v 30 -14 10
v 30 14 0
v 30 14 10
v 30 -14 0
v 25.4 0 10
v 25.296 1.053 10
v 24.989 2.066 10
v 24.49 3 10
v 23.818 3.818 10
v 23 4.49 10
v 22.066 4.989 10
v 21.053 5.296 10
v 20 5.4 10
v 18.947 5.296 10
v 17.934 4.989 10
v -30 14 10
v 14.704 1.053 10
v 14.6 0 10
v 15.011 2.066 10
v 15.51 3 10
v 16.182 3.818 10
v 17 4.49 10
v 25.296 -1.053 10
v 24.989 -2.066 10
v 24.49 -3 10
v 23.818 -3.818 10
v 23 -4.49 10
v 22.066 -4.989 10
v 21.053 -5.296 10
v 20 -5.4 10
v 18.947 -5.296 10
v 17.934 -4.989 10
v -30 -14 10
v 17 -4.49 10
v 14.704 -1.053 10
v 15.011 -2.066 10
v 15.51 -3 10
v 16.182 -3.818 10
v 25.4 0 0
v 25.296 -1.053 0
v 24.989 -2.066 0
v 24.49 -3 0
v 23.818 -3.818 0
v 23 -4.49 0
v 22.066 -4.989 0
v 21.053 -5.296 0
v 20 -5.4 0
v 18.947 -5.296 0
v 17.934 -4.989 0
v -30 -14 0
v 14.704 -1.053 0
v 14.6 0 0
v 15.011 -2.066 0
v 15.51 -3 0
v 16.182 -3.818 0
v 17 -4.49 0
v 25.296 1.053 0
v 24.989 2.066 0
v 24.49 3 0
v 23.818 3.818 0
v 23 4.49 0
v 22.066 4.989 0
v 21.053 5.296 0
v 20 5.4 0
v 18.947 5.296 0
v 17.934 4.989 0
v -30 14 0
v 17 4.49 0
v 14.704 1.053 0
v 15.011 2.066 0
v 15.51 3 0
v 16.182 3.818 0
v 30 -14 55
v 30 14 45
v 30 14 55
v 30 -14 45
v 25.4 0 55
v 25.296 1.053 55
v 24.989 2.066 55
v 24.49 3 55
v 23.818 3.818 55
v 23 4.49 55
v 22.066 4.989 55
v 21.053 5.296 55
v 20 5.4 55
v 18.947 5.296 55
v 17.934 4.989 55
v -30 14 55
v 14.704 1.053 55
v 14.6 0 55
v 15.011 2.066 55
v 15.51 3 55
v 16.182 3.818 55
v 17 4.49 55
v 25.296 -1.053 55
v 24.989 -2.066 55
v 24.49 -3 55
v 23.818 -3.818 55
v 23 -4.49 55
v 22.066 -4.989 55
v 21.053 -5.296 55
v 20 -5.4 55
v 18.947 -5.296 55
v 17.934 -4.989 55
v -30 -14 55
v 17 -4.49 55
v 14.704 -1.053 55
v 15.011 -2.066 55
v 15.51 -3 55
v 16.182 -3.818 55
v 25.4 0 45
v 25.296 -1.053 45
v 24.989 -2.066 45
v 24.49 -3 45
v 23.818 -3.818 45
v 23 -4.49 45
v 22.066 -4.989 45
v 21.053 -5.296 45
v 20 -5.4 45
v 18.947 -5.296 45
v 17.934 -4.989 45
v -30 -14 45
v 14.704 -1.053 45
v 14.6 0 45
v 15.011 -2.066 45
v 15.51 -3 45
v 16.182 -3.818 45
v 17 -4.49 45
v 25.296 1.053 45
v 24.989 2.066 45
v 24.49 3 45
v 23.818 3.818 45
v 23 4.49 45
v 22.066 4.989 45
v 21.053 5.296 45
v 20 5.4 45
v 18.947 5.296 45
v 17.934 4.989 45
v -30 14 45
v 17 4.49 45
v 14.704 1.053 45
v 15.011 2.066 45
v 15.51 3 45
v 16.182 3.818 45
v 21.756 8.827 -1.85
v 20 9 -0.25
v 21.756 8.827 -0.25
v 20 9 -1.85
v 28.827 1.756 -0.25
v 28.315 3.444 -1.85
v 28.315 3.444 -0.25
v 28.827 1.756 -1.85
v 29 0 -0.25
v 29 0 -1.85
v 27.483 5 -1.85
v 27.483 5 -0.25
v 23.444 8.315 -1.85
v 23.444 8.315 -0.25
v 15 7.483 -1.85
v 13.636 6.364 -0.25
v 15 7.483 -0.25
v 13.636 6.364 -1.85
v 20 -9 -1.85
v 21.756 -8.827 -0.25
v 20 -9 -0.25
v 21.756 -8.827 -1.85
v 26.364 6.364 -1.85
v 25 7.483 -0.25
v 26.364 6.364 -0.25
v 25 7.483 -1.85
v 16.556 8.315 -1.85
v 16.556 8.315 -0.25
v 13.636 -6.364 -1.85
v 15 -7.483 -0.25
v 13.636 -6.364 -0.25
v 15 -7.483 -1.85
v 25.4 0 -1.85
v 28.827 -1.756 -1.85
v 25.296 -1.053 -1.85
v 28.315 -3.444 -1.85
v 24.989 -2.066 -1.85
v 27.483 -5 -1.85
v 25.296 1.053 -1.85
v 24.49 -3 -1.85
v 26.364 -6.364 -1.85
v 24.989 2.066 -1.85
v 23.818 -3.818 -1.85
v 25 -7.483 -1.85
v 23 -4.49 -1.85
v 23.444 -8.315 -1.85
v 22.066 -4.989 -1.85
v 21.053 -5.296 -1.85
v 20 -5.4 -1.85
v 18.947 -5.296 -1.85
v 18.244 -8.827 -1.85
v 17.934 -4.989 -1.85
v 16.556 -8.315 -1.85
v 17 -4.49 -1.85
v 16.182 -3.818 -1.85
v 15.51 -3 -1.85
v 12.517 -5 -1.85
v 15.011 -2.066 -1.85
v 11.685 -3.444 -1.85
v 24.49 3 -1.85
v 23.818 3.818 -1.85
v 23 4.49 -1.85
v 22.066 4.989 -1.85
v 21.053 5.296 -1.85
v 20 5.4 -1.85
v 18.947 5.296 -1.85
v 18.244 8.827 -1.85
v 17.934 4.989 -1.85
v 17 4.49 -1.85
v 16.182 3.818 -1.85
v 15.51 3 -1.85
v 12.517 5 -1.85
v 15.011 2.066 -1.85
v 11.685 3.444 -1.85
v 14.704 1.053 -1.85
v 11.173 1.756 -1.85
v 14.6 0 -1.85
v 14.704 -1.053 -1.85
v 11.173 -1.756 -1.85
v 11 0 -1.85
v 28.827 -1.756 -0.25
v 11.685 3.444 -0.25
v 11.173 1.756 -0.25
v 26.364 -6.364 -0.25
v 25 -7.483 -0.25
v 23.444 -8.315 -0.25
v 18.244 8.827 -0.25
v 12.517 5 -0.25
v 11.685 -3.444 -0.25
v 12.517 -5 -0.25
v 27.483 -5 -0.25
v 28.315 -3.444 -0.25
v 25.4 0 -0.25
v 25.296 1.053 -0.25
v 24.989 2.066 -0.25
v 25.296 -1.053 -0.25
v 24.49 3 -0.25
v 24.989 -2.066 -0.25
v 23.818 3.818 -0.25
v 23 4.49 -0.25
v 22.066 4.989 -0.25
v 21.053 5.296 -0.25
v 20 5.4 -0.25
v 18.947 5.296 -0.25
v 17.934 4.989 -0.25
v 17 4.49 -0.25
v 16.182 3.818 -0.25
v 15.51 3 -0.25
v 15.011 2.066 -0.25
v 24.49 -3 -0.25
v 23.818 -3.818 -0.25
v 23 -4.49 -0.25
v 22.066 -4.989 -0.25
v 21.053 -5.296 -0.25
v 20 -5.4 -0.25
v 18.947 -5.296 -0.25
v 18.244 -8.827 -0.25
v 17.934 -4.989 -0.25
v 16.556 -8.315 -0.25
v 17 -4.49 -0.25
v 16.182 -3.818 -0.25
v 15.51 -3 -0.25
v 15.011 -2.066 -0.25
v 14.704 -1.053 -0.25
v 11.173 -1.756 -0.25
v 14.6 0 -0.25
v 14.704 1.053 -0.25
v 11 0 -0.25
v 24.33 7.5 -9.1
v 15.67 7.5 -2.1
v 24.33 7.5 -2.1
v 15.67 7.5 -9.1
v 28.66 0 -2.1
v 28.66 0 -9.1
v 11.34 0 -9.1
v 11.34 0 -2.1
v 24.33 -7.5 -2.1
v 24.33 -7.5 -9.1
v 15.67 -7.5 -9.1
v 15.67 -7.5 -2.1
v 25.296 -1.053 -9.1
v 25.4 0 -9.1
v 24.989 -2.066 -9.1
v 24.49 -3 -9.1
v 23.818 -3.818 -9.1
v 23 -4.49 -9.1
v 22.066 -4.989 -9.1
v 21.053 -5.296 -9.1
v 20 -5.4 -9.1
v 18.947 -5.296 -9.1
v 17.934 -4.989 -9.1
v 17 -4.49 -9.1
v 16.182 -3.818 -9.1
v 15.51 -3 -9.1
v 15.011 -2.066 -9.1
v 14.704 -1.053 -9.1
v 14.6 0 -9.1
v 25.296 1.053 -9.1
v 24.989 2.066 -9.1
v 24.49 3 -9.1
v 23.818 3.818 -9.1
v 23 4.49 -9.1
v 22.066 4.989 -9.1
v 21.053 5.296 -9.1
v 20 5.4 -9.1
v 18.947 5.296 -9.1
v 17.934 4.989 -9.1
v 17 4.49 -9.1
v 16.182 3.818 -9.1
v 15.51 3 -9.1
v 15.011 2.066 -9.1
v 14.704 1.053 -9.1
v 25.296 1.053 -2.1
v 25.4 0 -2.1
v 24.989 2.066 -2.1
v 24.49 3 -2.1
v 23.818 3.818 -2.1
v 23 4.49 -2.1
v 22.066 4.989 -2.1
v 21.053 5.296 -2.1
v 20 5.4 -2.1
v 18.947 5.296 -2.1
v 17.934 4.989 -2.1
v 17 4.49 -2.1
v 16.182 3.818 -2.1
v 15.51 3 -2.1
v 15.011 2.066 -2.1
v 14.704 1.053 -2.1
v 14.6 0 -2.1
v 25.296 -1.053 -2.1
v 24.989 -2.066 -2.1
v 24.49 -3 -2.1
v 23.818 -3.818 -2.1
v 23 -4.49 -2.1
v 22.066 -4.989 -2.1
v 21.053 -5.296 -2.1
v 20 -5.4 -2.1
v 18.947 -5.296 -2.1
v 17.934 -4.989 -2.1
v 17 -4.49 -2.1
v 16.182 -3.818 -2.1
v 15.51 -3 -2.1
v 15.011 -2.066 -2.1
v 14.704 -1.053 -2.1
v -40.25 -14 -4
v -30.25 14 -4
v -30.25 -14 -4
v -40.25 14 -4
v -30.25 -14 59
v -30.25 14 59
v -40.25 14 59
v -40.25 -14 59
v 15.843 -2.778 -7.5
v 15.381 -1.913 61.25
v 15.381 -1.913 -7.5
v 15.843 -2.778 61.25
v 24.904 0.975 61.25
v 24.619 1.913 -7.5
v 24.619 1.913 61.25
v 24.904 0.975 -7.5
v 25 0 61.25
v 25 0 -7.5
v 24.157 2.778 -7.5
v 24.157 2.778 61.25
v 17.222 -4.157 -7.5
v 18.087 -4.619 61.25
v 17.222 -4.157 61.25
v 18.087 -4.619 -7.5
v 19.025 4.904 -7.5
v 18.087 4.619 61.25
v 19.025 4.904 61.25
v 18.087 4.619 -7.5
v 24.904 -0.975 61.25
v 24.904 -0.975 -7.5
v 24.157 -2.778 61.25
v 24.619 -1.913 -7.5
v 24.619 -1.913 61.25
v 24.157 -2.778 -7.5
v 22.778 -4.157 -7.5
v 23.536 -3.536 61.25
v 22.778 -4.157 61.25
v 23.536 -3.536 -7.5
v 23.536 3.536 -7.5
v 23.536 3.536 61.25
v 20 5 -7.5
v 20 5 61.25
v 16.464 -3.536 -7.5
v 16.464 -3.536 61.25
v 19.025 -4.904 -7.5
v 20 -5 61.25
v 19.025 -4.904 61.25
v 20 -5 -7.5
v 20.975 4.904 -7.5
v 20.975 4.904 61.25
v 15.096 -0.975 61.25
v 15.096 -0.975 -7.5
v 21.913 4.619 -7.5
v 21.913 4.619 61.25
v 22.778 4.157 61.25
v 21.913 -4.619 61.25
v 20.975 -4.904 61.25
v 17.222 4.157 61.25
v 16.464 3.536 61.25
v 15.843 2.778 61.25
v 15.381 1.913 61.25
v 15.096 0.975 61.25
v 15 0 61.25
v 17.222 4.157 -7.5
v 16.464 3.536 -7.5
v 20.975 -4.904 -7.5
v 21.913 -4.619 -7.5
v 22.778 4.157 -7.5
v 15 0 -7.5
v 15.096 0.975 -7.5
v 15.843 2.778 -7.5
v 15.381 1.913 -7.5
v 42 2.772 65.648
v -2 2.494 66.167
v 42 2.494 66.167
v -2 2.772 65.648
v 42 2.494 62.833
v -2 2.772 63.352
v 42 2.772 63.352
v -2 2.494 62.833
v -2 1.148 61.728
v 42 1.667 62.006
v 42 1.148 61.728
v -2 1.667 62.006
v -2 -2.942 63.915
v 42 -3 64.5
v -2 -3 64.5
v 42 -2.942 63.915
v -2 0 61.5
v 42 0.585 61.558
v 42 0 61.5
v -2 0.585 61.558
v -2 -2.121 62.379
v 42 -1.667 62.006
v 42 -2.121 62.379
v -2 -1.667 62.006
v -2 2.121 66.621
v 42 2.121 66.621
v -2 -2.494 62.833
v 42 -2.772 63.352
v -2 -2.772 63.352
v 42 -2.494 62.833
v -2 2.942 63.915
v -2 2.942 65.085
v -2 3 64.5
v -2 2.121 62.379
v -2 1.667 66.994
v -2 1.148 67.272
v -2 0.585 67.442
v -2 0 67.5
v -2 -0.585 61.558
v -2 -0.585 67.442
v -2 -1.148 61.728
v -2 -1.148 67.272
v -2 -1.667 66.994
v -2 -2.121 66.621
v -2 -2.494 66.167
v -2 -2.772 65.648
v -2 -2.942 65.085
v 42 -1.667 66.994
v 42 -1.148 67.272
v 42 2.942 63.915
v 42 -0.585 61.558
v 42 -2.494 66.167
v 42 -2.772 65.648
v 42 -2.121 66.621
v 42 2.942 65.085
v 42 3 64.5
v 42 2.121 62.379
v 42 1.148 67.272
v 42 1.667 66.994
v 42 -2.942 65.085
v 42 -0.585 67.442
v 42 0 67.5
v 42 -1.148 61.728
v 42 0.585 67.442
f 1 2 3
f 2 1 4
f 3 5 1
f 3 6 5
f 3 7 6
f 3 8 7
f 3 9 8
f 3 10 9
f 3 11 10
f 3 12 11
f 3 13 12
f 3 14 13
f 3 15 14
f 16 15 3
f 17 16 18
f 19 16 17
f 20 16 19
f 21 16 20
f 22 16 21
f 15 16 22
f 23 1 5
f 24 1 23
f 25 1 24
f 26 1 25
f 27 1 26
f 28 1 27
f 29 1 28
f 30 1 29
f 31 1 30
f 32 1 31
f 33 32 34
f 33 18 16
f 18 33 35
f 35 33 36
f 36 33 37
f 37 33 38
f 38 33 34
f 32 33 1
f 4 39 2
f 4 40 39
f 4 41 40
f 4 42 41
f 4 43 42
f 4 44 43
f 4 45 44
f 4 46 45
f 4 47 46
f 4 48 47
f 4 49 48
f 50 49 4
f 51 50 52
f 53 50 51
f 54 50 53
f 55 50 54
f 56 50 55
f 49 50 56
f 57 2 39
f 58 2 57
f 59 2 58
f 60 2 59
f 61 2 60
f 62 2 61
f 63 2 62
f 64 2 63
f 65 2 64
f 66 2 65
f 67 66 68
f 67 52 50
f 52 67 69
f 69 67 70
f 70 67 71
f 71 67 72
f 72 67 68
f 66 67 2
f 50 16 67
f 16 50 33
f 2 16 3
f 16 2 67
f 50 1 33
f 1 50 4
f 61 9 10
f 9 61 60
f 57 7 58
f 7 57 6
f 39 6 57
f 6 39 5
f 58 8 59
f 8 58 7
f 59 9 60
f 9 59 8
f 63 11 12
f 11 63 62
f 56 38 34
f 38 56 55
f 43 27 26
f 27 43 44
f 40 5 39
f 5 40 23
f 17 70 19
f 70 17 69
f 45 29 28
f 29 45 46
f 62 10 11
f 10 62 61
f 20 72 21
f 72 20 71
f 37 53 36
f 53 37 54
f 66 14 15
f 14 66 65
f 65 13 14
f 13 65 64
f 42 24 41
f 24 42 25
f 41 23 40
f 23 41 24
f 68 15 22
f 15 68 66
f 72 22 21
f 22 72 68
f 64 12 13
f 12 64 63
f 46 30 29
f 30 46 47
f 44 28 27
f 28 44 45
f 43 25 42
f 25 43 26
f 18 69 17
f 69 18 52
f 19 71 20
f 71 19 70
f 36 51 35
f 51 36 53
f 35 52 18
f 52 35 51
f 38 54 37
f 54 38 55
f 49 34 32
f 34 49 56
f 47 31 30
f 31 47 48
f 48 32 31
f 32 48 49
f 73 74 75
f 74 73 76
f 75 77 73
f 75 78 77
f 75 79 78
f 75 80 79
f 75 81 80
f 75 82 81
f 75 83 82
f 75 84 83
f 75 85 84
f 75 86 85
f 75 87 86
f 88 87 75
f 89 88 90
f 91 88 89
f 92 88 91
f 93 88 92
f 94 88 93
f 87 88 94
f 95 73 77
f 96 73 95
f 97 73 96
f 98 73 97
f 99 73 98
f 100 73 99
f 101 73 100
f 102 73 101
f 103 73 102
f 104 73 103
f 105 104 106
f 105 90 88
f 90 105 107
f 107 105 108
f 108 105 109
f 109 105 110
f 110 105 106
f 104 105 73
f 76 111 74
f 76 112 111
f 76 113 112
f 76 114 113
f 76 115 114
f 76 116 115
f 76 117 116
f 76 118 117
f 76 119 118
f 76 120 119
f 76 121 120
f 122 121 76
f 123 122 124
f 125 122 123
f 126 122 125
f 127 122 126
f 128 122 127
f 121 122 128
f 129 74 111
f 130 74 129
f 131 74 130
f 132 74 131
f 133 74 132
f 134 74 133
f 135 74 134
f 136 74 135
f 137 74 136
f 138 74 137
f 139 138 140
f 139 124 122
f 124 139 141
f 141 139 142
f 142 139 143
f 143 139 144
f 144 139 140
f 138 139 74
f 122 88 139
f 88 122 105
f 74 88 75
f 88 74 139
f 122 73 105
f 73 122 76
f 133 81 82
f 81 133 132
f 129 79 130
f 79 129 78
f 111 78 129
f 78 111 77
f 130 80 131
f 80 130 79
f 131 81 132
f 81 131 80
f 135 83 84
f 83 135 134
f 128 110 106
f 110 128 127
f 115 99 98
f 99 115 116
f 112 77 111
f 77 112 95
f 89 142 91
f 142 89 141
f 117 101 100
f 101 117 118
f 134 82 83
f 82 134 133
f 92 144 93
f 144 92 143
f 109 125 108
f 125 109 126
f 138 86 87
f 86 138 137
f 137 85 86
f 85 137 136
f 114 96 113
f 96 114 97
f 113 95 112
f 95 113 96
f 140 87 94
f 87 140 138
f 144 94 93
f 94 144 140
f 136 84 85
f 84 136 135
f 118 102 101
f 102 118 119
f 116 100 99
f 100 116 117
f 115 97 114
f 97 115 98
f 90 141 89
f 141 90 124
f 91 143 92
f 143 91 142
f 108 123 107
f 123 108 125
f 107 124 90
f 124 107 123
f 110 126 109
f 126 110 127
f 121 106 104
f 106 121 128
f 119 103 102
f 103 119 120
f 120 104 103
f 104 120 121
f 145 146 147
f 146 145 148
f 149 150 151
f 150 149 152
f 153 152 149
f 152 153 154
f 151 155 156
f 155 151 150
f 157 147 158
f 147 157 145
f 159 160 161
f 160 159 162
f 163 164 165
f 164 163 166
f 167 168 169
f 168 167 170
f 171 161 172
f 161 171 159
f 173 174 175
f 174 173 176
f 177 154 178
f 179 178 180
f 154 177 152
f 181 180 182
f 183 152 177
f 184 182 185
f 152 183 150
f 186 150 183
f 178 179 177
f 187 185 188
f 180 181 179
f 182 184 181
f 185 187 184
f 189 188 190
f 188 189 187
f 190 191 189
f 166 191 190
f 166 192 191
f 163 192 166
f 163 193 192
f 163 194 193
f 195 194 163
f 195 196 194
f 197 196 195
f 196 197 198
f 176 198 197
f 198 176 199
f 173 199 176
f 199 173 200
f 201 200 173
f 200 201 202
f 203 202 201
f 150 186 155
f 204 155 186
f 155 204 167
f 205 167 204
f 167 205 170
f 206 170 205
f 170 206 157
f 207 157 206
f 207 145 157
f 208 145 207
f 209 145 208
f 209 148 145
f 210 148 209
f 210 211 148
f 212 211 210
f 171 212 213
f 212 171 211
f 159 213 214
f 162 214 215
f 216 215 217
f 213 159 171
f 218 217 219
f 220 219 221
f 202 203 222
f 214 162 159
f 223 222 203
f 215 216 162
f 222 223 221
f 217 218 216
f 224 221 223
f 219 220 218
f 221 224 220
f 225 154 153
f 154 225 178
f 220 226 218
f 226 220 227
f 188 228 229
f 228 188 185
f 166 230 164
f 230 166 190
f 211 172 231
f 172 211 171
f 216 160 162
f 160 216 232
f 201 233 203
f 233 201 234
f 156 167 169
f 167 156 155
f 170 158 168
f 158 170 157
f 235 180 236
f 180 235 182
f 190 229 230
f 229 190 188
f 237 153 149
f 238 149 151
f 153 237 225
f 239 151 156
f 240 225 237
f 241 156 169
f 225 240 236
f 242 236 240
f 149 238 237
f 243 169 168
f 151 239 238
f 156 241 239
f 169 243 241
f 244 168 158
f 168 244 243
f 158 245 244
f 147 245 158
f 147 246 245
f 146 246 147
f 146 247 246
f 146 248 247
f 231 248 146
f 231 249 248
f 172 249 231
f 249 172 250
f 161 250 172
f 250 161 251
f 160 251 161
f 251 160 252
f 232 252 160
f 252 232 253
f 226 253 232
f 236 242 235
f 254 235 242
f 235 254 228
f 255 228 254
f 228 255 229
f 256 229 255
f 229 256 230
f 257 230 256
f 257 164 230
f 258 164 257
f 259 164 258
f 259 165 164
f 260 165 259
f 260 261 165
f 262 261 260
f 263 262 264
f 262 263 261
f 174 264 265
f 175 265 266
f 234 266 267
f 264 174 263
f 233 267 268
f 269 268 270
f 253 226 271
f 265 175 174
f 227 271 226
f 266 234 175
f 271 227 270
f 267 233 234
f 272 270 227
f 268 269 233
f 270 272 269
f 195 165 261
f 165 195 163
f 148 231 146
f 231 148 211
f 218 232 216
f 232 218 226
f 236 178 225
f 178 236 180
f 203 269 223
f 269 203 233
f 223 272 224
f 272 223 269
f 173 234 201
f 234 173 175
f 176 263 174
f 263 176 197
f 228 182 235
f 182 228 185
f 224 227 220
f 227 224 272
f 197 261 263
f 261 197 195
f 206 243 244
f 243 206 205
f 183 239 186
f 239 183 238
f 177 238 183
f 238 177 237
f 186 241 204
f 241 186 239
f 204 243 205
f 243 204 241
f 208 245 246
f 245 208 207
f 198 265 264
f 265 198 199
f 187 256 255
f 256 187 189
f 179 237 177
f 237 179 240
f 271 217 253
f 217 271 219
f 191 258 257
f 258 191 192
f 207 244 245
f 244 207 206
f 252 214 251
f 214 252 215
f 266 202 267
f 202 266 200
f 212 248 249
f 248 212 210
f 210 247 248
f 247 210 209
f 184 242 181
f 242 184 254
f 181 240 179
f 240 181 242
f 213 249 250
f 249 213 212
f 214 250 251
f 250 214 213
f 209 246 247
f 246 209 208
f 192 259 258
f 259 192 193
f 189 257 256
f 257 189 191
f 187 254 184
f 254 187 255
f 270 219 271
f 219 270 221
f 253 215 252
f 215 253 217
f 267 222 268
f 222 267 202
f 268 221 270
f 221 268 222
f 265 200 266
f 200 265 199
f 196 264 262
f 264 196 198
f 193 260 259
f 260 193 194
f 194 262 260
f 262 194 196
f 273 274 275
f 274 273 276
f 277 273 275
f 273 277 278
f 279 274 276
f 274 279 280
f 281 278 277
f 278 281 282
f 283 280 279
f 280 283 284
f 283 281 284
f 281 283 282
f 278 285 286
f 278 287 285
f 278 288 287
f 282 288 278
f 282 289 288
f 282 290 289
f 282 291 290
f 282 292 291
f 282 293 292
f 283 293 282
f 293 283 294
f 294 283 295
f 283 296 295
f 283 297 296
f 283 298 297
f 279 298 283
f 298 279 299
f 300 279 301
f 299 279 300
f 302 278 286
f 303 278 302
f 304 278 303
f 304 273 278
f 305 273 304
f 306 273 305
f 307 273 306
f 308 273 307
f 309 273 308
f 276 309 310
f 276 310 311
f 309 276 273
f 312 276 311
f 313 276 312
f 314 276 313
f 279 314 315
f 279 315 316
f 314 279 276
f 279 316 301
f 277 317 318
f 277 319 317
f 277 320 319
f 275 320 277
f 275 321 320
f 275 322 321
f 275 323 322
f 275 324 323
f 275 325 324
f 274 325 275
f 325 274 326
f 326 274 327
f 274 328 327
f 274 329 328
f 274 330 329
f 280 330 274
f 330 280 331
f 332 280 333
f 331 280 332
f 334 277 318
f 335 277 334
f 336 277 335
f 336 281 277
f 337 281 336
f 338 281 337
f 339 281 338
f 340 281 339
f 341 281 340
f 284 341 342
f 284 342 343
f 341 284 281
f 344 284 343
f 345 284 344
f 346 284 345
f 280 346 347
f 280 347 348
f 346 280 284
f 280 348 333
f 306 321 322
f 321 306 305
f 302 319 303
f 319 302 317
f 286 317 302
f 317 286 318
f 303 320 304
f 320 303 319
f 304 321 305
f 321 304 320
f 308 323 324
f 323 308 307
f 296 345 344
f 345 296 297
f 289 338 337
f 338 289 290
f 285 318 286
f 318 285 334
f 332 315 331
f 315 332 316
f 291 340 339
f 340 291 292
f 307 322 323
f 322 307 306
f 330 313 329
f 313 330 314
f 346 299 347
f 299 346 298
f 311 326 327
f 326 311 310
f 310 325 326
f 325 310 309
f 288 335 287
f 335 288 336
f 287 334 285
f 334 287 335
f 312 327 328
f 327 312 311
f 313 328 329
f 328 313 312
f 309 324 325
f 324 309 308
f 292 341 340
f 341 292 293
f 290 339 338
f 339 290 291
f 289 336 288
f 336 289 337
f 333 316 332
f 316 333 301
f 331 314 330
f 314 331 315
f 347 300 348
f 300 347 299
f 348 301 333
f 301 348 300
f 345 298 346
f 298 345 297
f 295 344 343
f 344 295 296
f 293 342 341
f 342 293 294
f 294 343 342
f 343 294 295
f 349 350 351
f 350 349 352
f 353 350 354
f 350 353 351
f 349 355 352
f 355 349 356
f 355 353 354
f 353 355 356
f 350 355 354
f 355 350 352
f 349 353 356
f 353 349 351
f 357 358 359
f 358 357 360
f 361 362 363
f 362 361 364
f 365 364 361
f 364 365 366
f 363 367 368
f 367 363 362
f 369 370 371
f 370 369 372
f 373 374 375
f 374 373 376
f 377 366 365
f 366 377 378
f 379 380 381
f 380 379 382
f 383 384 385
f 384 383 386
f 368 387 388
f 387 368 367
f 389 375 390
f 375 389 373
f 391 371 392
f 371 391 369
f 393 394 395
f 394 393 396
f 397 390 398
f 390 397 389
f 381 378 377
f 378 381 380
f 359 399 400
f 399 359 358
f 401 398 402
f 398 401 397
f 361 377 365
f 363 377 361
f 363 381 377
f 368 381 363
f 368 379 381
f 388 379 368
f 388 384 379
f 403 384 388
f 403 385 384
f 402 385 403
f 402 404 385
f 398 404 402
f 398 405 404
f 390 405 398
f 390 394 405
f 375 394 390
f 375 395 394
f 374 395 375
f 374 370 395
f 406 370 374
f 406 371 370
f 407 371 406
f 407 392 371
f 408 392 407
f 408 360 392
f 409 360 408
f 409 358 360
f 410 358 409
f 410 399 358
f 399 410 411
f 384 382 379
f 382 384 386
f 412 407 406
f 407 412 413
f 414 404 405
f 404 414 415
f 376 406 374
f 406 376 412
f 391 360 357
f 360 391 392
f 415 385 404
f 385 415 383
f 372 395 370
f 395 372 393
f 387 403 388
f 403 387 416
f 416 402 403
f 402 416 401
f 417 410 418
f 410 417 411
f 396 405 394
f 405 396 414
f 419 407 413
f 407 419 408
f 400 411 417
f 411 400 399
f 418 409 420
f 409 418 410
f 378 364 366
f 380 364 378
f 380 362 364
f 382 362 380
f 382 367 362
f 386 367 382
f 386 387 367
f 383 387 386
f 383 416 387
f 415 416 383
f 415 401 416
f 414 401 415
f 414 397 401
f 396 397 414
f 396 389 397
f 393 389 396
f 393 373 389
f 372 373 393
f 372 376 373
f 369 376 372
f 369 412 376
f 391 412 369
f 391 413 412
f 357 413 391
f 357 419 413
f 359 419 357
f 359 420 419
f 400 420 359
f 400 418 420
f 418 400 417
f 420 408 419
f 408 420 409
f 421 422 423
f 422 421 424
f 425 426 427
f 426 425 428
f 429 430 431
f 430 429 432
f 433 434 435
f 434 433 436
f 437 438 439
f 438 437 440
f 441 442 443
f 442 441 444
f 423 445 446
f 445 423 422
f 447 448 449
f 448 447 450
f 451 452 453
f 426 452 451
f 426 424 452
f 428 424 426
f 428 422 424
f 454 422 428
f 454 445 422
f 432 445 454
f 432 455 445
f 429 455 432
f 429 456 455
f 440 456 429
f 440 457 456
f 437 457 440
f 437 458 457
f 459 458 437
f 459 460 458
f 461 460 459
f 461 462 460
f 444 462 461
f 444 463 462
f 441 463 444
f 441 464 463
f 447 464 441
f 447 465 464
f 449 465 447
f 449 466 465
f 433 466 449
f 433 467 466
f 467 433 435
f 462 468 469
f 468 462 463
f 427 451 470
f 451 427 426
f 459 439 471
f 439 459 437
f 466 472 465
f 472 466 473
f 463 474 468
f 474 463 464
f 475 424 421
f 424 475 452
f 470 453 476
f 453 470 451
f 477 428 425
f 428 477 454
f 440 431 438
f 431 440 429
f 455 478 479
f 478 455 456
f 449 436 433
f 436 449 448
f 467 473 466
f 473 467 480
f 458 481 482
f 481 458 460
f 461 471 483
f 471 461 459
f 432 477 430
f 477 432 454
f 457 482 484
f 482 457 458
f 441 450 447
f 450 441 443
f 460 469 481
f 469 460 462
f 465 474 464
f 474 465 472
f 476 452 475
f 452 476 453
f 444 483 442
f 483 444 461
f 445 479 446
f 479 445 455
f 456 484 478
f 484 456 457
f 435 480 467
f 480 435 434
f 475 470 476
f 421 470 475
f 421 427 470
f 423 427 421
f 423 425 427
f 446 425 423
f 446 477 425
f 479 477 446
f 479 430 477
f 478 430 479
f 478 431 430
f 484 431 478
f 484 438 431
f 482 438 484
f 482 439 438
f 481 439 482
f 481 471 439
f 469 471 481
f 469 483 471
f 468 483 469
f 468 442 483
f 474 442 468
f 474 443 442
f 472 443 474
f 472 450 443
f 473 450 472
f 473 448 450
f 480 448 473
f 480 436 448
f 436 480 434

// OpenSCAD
$fn = 32;

// ------------------------------------------------------------------------
// C clamp: throat 45 mm, screw d10
// Every part is its own module, assembly() places every instance.
// ------------------------------------------------------------------------

// --- part 1 ---
module clamp_arm() {
  difference() {
    translate([-30, -14, 0]) cube([60, 28, 10]);
    translate([20, 0, -1]) cylinder(h = 12, d = 10.8);
  }
}

// --- part 2 ---
module clamp_spine() {
  difference() {
    translate([-31.5, -14, 0]) cube([63, 28, 10]);
  }
}

// --- part 3 ---
module clamp_screw() {
  translate([0, 0, -34.375]) cylinder(h = 68.75, d = 10);
}

// --- part 4 ---
module clamp_washer() {
  difference() {
      translate([0, 0, 0]) cylinder(h = 1.6, d = 18);
      translate([0, 0, -1]) cylinder(h = 3.6, d = 10.8);
    }
}

// --- part 5 ---
module clamp_nut() {
  difference() {
    linear_extrude(height = 7) polygon(points = [[8.66, 0], [4.33, 7.5], [-4.33, 7.5], [-8.66, 0], [-4.33, -7.5], [4.33, -7.5]]);
    translate([0, 0, -1]) cylinder(h = 9, d = 10.8);
  }
}

// --- part 6 ---
module tommy_bar() {
  translate([0, 0, -22]) cylinder(h = 44, d = 6);
}

// --- assembly ---
module assembly() {
  color([0.80, 0.24, 0.20]) translate([0, 0, 0]) rotate([0, 0, 0]) clamp_arm();
  color([0.20, 0.45, 0.75]) translate([0, 0, 45]) rotate([0, 0, 0]) clamp_arm();
  color([0.25, 0.62, 0.32]) translate([-40.25, 0, 27.5]) rotate([0, 90, 0]) clamp_spine();
  color([0.92, 0.70, 0.18]) translate([20, 0, 26.875]) rotate([0, 0, 0]) clamp_screw();
  color([0.58, 0.35, 0.70]) translate([20, 0, -1.85]) rotate([0, 0, 0]) clamp_washer();
  color([0.16, 0.66, 0.66]) translate([20, 0, -9.1]) rotate([0, 0, 0]) clamp_nut();
  color([0.85, 0.48, 0.18]) translate([20, 0, 64.5]) rotate([0, 90, 0]) tommy_bar();
}

assembly();
